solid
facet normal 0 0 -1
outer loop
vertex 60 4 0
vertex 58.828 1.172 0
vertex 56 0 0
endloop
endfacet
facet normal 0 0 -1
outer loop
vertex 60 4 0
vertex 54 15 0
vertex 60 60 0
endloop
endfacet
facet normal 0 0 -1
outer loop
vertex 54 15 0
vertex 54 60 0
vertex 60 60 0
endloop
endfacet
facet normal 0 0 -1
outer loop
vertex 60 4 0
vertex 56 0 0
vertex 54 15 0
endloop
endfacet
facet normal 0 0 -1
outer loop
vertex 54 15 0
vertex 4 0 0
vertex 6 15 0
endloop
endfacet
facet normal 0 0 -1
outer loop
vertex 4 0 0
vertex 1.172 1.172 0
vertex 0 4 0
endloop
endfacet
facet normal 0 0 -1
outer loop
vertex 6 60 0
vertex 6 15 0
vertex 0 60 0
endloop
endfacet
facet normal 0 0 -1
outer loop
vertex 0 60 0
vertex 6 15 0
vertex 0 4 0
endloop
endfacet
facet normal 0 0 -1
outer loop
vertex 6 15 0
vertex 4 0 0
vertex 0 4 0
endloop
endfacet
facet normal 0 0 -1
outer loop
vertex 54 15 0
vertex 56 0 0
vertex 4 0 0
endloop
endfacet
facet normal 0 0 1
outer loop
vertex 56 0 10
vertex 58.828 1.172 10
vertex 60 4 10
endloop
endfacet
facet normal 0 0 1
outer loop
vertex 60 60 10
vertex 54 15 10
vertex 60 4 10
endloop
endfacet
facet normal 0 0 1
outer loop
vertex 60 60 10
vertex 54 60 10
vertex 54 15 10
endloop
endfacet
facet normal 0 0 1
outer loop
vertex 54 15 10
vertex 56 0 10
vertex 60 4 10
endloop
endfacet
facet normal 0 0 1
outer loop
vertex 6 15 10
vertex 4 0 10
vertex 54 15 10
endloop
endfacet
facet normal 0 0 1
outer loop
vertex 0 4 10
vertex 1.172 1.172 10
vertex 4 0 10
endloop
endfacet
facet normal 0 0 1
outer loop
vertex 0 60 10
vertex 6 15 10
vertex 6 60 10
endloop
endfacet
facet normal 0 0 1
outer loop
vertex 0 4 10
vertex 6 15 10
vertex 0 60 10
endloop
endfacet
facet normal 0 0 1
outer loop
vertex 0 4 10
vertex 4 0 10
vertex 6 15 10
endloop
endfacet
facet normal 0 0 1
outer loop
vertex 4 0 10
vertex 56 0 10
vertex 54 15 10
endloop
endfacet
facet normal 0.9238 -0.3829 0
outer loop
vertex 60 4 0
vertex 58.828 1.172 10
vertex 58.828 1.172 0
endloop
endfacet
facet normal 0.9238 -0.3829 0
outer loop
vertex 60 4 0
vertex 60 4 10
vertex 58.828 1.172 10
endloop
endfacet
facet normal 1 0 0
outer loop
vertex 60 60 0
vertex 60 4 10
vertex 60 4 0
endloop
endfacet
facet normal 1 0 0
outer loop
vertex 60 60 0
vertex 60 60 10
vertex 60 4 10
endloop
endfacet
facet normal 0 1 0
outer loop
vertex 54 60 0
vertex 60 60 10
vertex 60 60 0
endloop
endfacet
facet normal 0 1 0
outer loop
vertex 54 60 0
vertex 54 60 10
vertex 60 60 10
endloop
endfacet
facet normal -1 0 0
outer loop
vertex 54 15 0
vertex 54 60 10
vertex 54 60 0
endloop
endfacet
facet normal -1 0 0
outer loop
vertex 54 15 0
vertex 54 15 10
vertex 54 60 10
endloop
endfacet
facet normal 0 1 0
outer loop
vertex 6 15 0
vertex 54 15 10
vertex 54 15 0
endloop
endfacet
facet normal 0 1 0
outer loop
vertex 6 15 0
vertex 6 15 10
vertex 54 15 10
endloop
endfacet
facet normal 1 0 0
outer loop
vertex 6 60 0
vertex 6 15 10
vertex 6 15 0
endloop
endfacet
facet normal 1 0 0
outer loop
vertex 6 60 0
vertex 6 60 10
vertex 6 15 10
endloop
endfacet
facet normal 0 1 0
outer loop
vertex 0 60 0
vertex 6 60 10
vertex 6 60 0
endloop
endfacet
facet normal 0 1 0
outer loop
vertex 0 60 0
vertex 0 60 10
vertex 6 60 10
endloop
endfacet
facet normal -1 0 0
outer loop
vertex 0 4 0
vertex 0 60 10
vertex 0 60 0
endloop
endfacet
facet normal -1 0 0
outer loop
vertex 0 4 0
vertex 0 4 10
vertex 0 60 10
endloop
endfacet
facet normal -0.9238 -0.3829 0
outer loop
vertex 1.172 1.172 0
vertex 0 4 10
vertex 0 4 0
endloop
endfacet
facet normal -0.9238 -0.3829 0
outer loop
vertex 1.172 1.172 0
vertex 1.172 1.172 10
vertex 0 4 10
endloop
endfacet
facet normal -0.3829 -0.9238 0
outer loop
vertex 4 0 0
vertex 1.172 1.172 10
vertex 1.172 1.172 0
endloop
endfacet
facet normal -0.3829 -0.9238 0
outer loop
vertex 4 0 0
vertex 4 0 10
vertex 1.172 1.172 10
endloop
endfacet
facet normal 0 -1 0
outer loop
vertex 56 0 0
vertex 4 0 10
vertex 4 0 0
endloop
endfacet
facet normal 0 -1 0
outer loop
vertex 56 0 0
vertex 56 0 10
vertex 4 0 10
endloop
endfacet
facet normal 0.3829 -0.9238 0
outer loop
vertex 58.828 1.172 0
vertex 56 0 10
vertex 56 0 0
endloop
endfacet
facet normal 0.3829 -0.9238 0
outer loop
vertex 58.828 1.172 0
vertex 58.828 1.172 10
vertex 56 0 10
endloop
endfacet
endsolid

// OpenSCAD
$fn = 32;

// ----------------------------------------------------------------------
// Heat sink frame: 60 x 60 mm frame, 6 mm walls
// ----------------------------------------------------------------------

// --- parameters (mm) ---
profile_height = 10;      // extrusion height
profile_points = 12;      // points of the closed outline

profile = [[0, 4], [1.172, 1.172], [4, 0], [56, 0], [58.828, 1.172], [60, 4], [60, 60], [54, 60], [54, 15], [6, 15], [6, 60], [0, 60]];  // single closed polygon, 12 points, counter clockwise

// --- the one profile operation ---
linear_extrude(height = profile_height) polygon(points = profile);
